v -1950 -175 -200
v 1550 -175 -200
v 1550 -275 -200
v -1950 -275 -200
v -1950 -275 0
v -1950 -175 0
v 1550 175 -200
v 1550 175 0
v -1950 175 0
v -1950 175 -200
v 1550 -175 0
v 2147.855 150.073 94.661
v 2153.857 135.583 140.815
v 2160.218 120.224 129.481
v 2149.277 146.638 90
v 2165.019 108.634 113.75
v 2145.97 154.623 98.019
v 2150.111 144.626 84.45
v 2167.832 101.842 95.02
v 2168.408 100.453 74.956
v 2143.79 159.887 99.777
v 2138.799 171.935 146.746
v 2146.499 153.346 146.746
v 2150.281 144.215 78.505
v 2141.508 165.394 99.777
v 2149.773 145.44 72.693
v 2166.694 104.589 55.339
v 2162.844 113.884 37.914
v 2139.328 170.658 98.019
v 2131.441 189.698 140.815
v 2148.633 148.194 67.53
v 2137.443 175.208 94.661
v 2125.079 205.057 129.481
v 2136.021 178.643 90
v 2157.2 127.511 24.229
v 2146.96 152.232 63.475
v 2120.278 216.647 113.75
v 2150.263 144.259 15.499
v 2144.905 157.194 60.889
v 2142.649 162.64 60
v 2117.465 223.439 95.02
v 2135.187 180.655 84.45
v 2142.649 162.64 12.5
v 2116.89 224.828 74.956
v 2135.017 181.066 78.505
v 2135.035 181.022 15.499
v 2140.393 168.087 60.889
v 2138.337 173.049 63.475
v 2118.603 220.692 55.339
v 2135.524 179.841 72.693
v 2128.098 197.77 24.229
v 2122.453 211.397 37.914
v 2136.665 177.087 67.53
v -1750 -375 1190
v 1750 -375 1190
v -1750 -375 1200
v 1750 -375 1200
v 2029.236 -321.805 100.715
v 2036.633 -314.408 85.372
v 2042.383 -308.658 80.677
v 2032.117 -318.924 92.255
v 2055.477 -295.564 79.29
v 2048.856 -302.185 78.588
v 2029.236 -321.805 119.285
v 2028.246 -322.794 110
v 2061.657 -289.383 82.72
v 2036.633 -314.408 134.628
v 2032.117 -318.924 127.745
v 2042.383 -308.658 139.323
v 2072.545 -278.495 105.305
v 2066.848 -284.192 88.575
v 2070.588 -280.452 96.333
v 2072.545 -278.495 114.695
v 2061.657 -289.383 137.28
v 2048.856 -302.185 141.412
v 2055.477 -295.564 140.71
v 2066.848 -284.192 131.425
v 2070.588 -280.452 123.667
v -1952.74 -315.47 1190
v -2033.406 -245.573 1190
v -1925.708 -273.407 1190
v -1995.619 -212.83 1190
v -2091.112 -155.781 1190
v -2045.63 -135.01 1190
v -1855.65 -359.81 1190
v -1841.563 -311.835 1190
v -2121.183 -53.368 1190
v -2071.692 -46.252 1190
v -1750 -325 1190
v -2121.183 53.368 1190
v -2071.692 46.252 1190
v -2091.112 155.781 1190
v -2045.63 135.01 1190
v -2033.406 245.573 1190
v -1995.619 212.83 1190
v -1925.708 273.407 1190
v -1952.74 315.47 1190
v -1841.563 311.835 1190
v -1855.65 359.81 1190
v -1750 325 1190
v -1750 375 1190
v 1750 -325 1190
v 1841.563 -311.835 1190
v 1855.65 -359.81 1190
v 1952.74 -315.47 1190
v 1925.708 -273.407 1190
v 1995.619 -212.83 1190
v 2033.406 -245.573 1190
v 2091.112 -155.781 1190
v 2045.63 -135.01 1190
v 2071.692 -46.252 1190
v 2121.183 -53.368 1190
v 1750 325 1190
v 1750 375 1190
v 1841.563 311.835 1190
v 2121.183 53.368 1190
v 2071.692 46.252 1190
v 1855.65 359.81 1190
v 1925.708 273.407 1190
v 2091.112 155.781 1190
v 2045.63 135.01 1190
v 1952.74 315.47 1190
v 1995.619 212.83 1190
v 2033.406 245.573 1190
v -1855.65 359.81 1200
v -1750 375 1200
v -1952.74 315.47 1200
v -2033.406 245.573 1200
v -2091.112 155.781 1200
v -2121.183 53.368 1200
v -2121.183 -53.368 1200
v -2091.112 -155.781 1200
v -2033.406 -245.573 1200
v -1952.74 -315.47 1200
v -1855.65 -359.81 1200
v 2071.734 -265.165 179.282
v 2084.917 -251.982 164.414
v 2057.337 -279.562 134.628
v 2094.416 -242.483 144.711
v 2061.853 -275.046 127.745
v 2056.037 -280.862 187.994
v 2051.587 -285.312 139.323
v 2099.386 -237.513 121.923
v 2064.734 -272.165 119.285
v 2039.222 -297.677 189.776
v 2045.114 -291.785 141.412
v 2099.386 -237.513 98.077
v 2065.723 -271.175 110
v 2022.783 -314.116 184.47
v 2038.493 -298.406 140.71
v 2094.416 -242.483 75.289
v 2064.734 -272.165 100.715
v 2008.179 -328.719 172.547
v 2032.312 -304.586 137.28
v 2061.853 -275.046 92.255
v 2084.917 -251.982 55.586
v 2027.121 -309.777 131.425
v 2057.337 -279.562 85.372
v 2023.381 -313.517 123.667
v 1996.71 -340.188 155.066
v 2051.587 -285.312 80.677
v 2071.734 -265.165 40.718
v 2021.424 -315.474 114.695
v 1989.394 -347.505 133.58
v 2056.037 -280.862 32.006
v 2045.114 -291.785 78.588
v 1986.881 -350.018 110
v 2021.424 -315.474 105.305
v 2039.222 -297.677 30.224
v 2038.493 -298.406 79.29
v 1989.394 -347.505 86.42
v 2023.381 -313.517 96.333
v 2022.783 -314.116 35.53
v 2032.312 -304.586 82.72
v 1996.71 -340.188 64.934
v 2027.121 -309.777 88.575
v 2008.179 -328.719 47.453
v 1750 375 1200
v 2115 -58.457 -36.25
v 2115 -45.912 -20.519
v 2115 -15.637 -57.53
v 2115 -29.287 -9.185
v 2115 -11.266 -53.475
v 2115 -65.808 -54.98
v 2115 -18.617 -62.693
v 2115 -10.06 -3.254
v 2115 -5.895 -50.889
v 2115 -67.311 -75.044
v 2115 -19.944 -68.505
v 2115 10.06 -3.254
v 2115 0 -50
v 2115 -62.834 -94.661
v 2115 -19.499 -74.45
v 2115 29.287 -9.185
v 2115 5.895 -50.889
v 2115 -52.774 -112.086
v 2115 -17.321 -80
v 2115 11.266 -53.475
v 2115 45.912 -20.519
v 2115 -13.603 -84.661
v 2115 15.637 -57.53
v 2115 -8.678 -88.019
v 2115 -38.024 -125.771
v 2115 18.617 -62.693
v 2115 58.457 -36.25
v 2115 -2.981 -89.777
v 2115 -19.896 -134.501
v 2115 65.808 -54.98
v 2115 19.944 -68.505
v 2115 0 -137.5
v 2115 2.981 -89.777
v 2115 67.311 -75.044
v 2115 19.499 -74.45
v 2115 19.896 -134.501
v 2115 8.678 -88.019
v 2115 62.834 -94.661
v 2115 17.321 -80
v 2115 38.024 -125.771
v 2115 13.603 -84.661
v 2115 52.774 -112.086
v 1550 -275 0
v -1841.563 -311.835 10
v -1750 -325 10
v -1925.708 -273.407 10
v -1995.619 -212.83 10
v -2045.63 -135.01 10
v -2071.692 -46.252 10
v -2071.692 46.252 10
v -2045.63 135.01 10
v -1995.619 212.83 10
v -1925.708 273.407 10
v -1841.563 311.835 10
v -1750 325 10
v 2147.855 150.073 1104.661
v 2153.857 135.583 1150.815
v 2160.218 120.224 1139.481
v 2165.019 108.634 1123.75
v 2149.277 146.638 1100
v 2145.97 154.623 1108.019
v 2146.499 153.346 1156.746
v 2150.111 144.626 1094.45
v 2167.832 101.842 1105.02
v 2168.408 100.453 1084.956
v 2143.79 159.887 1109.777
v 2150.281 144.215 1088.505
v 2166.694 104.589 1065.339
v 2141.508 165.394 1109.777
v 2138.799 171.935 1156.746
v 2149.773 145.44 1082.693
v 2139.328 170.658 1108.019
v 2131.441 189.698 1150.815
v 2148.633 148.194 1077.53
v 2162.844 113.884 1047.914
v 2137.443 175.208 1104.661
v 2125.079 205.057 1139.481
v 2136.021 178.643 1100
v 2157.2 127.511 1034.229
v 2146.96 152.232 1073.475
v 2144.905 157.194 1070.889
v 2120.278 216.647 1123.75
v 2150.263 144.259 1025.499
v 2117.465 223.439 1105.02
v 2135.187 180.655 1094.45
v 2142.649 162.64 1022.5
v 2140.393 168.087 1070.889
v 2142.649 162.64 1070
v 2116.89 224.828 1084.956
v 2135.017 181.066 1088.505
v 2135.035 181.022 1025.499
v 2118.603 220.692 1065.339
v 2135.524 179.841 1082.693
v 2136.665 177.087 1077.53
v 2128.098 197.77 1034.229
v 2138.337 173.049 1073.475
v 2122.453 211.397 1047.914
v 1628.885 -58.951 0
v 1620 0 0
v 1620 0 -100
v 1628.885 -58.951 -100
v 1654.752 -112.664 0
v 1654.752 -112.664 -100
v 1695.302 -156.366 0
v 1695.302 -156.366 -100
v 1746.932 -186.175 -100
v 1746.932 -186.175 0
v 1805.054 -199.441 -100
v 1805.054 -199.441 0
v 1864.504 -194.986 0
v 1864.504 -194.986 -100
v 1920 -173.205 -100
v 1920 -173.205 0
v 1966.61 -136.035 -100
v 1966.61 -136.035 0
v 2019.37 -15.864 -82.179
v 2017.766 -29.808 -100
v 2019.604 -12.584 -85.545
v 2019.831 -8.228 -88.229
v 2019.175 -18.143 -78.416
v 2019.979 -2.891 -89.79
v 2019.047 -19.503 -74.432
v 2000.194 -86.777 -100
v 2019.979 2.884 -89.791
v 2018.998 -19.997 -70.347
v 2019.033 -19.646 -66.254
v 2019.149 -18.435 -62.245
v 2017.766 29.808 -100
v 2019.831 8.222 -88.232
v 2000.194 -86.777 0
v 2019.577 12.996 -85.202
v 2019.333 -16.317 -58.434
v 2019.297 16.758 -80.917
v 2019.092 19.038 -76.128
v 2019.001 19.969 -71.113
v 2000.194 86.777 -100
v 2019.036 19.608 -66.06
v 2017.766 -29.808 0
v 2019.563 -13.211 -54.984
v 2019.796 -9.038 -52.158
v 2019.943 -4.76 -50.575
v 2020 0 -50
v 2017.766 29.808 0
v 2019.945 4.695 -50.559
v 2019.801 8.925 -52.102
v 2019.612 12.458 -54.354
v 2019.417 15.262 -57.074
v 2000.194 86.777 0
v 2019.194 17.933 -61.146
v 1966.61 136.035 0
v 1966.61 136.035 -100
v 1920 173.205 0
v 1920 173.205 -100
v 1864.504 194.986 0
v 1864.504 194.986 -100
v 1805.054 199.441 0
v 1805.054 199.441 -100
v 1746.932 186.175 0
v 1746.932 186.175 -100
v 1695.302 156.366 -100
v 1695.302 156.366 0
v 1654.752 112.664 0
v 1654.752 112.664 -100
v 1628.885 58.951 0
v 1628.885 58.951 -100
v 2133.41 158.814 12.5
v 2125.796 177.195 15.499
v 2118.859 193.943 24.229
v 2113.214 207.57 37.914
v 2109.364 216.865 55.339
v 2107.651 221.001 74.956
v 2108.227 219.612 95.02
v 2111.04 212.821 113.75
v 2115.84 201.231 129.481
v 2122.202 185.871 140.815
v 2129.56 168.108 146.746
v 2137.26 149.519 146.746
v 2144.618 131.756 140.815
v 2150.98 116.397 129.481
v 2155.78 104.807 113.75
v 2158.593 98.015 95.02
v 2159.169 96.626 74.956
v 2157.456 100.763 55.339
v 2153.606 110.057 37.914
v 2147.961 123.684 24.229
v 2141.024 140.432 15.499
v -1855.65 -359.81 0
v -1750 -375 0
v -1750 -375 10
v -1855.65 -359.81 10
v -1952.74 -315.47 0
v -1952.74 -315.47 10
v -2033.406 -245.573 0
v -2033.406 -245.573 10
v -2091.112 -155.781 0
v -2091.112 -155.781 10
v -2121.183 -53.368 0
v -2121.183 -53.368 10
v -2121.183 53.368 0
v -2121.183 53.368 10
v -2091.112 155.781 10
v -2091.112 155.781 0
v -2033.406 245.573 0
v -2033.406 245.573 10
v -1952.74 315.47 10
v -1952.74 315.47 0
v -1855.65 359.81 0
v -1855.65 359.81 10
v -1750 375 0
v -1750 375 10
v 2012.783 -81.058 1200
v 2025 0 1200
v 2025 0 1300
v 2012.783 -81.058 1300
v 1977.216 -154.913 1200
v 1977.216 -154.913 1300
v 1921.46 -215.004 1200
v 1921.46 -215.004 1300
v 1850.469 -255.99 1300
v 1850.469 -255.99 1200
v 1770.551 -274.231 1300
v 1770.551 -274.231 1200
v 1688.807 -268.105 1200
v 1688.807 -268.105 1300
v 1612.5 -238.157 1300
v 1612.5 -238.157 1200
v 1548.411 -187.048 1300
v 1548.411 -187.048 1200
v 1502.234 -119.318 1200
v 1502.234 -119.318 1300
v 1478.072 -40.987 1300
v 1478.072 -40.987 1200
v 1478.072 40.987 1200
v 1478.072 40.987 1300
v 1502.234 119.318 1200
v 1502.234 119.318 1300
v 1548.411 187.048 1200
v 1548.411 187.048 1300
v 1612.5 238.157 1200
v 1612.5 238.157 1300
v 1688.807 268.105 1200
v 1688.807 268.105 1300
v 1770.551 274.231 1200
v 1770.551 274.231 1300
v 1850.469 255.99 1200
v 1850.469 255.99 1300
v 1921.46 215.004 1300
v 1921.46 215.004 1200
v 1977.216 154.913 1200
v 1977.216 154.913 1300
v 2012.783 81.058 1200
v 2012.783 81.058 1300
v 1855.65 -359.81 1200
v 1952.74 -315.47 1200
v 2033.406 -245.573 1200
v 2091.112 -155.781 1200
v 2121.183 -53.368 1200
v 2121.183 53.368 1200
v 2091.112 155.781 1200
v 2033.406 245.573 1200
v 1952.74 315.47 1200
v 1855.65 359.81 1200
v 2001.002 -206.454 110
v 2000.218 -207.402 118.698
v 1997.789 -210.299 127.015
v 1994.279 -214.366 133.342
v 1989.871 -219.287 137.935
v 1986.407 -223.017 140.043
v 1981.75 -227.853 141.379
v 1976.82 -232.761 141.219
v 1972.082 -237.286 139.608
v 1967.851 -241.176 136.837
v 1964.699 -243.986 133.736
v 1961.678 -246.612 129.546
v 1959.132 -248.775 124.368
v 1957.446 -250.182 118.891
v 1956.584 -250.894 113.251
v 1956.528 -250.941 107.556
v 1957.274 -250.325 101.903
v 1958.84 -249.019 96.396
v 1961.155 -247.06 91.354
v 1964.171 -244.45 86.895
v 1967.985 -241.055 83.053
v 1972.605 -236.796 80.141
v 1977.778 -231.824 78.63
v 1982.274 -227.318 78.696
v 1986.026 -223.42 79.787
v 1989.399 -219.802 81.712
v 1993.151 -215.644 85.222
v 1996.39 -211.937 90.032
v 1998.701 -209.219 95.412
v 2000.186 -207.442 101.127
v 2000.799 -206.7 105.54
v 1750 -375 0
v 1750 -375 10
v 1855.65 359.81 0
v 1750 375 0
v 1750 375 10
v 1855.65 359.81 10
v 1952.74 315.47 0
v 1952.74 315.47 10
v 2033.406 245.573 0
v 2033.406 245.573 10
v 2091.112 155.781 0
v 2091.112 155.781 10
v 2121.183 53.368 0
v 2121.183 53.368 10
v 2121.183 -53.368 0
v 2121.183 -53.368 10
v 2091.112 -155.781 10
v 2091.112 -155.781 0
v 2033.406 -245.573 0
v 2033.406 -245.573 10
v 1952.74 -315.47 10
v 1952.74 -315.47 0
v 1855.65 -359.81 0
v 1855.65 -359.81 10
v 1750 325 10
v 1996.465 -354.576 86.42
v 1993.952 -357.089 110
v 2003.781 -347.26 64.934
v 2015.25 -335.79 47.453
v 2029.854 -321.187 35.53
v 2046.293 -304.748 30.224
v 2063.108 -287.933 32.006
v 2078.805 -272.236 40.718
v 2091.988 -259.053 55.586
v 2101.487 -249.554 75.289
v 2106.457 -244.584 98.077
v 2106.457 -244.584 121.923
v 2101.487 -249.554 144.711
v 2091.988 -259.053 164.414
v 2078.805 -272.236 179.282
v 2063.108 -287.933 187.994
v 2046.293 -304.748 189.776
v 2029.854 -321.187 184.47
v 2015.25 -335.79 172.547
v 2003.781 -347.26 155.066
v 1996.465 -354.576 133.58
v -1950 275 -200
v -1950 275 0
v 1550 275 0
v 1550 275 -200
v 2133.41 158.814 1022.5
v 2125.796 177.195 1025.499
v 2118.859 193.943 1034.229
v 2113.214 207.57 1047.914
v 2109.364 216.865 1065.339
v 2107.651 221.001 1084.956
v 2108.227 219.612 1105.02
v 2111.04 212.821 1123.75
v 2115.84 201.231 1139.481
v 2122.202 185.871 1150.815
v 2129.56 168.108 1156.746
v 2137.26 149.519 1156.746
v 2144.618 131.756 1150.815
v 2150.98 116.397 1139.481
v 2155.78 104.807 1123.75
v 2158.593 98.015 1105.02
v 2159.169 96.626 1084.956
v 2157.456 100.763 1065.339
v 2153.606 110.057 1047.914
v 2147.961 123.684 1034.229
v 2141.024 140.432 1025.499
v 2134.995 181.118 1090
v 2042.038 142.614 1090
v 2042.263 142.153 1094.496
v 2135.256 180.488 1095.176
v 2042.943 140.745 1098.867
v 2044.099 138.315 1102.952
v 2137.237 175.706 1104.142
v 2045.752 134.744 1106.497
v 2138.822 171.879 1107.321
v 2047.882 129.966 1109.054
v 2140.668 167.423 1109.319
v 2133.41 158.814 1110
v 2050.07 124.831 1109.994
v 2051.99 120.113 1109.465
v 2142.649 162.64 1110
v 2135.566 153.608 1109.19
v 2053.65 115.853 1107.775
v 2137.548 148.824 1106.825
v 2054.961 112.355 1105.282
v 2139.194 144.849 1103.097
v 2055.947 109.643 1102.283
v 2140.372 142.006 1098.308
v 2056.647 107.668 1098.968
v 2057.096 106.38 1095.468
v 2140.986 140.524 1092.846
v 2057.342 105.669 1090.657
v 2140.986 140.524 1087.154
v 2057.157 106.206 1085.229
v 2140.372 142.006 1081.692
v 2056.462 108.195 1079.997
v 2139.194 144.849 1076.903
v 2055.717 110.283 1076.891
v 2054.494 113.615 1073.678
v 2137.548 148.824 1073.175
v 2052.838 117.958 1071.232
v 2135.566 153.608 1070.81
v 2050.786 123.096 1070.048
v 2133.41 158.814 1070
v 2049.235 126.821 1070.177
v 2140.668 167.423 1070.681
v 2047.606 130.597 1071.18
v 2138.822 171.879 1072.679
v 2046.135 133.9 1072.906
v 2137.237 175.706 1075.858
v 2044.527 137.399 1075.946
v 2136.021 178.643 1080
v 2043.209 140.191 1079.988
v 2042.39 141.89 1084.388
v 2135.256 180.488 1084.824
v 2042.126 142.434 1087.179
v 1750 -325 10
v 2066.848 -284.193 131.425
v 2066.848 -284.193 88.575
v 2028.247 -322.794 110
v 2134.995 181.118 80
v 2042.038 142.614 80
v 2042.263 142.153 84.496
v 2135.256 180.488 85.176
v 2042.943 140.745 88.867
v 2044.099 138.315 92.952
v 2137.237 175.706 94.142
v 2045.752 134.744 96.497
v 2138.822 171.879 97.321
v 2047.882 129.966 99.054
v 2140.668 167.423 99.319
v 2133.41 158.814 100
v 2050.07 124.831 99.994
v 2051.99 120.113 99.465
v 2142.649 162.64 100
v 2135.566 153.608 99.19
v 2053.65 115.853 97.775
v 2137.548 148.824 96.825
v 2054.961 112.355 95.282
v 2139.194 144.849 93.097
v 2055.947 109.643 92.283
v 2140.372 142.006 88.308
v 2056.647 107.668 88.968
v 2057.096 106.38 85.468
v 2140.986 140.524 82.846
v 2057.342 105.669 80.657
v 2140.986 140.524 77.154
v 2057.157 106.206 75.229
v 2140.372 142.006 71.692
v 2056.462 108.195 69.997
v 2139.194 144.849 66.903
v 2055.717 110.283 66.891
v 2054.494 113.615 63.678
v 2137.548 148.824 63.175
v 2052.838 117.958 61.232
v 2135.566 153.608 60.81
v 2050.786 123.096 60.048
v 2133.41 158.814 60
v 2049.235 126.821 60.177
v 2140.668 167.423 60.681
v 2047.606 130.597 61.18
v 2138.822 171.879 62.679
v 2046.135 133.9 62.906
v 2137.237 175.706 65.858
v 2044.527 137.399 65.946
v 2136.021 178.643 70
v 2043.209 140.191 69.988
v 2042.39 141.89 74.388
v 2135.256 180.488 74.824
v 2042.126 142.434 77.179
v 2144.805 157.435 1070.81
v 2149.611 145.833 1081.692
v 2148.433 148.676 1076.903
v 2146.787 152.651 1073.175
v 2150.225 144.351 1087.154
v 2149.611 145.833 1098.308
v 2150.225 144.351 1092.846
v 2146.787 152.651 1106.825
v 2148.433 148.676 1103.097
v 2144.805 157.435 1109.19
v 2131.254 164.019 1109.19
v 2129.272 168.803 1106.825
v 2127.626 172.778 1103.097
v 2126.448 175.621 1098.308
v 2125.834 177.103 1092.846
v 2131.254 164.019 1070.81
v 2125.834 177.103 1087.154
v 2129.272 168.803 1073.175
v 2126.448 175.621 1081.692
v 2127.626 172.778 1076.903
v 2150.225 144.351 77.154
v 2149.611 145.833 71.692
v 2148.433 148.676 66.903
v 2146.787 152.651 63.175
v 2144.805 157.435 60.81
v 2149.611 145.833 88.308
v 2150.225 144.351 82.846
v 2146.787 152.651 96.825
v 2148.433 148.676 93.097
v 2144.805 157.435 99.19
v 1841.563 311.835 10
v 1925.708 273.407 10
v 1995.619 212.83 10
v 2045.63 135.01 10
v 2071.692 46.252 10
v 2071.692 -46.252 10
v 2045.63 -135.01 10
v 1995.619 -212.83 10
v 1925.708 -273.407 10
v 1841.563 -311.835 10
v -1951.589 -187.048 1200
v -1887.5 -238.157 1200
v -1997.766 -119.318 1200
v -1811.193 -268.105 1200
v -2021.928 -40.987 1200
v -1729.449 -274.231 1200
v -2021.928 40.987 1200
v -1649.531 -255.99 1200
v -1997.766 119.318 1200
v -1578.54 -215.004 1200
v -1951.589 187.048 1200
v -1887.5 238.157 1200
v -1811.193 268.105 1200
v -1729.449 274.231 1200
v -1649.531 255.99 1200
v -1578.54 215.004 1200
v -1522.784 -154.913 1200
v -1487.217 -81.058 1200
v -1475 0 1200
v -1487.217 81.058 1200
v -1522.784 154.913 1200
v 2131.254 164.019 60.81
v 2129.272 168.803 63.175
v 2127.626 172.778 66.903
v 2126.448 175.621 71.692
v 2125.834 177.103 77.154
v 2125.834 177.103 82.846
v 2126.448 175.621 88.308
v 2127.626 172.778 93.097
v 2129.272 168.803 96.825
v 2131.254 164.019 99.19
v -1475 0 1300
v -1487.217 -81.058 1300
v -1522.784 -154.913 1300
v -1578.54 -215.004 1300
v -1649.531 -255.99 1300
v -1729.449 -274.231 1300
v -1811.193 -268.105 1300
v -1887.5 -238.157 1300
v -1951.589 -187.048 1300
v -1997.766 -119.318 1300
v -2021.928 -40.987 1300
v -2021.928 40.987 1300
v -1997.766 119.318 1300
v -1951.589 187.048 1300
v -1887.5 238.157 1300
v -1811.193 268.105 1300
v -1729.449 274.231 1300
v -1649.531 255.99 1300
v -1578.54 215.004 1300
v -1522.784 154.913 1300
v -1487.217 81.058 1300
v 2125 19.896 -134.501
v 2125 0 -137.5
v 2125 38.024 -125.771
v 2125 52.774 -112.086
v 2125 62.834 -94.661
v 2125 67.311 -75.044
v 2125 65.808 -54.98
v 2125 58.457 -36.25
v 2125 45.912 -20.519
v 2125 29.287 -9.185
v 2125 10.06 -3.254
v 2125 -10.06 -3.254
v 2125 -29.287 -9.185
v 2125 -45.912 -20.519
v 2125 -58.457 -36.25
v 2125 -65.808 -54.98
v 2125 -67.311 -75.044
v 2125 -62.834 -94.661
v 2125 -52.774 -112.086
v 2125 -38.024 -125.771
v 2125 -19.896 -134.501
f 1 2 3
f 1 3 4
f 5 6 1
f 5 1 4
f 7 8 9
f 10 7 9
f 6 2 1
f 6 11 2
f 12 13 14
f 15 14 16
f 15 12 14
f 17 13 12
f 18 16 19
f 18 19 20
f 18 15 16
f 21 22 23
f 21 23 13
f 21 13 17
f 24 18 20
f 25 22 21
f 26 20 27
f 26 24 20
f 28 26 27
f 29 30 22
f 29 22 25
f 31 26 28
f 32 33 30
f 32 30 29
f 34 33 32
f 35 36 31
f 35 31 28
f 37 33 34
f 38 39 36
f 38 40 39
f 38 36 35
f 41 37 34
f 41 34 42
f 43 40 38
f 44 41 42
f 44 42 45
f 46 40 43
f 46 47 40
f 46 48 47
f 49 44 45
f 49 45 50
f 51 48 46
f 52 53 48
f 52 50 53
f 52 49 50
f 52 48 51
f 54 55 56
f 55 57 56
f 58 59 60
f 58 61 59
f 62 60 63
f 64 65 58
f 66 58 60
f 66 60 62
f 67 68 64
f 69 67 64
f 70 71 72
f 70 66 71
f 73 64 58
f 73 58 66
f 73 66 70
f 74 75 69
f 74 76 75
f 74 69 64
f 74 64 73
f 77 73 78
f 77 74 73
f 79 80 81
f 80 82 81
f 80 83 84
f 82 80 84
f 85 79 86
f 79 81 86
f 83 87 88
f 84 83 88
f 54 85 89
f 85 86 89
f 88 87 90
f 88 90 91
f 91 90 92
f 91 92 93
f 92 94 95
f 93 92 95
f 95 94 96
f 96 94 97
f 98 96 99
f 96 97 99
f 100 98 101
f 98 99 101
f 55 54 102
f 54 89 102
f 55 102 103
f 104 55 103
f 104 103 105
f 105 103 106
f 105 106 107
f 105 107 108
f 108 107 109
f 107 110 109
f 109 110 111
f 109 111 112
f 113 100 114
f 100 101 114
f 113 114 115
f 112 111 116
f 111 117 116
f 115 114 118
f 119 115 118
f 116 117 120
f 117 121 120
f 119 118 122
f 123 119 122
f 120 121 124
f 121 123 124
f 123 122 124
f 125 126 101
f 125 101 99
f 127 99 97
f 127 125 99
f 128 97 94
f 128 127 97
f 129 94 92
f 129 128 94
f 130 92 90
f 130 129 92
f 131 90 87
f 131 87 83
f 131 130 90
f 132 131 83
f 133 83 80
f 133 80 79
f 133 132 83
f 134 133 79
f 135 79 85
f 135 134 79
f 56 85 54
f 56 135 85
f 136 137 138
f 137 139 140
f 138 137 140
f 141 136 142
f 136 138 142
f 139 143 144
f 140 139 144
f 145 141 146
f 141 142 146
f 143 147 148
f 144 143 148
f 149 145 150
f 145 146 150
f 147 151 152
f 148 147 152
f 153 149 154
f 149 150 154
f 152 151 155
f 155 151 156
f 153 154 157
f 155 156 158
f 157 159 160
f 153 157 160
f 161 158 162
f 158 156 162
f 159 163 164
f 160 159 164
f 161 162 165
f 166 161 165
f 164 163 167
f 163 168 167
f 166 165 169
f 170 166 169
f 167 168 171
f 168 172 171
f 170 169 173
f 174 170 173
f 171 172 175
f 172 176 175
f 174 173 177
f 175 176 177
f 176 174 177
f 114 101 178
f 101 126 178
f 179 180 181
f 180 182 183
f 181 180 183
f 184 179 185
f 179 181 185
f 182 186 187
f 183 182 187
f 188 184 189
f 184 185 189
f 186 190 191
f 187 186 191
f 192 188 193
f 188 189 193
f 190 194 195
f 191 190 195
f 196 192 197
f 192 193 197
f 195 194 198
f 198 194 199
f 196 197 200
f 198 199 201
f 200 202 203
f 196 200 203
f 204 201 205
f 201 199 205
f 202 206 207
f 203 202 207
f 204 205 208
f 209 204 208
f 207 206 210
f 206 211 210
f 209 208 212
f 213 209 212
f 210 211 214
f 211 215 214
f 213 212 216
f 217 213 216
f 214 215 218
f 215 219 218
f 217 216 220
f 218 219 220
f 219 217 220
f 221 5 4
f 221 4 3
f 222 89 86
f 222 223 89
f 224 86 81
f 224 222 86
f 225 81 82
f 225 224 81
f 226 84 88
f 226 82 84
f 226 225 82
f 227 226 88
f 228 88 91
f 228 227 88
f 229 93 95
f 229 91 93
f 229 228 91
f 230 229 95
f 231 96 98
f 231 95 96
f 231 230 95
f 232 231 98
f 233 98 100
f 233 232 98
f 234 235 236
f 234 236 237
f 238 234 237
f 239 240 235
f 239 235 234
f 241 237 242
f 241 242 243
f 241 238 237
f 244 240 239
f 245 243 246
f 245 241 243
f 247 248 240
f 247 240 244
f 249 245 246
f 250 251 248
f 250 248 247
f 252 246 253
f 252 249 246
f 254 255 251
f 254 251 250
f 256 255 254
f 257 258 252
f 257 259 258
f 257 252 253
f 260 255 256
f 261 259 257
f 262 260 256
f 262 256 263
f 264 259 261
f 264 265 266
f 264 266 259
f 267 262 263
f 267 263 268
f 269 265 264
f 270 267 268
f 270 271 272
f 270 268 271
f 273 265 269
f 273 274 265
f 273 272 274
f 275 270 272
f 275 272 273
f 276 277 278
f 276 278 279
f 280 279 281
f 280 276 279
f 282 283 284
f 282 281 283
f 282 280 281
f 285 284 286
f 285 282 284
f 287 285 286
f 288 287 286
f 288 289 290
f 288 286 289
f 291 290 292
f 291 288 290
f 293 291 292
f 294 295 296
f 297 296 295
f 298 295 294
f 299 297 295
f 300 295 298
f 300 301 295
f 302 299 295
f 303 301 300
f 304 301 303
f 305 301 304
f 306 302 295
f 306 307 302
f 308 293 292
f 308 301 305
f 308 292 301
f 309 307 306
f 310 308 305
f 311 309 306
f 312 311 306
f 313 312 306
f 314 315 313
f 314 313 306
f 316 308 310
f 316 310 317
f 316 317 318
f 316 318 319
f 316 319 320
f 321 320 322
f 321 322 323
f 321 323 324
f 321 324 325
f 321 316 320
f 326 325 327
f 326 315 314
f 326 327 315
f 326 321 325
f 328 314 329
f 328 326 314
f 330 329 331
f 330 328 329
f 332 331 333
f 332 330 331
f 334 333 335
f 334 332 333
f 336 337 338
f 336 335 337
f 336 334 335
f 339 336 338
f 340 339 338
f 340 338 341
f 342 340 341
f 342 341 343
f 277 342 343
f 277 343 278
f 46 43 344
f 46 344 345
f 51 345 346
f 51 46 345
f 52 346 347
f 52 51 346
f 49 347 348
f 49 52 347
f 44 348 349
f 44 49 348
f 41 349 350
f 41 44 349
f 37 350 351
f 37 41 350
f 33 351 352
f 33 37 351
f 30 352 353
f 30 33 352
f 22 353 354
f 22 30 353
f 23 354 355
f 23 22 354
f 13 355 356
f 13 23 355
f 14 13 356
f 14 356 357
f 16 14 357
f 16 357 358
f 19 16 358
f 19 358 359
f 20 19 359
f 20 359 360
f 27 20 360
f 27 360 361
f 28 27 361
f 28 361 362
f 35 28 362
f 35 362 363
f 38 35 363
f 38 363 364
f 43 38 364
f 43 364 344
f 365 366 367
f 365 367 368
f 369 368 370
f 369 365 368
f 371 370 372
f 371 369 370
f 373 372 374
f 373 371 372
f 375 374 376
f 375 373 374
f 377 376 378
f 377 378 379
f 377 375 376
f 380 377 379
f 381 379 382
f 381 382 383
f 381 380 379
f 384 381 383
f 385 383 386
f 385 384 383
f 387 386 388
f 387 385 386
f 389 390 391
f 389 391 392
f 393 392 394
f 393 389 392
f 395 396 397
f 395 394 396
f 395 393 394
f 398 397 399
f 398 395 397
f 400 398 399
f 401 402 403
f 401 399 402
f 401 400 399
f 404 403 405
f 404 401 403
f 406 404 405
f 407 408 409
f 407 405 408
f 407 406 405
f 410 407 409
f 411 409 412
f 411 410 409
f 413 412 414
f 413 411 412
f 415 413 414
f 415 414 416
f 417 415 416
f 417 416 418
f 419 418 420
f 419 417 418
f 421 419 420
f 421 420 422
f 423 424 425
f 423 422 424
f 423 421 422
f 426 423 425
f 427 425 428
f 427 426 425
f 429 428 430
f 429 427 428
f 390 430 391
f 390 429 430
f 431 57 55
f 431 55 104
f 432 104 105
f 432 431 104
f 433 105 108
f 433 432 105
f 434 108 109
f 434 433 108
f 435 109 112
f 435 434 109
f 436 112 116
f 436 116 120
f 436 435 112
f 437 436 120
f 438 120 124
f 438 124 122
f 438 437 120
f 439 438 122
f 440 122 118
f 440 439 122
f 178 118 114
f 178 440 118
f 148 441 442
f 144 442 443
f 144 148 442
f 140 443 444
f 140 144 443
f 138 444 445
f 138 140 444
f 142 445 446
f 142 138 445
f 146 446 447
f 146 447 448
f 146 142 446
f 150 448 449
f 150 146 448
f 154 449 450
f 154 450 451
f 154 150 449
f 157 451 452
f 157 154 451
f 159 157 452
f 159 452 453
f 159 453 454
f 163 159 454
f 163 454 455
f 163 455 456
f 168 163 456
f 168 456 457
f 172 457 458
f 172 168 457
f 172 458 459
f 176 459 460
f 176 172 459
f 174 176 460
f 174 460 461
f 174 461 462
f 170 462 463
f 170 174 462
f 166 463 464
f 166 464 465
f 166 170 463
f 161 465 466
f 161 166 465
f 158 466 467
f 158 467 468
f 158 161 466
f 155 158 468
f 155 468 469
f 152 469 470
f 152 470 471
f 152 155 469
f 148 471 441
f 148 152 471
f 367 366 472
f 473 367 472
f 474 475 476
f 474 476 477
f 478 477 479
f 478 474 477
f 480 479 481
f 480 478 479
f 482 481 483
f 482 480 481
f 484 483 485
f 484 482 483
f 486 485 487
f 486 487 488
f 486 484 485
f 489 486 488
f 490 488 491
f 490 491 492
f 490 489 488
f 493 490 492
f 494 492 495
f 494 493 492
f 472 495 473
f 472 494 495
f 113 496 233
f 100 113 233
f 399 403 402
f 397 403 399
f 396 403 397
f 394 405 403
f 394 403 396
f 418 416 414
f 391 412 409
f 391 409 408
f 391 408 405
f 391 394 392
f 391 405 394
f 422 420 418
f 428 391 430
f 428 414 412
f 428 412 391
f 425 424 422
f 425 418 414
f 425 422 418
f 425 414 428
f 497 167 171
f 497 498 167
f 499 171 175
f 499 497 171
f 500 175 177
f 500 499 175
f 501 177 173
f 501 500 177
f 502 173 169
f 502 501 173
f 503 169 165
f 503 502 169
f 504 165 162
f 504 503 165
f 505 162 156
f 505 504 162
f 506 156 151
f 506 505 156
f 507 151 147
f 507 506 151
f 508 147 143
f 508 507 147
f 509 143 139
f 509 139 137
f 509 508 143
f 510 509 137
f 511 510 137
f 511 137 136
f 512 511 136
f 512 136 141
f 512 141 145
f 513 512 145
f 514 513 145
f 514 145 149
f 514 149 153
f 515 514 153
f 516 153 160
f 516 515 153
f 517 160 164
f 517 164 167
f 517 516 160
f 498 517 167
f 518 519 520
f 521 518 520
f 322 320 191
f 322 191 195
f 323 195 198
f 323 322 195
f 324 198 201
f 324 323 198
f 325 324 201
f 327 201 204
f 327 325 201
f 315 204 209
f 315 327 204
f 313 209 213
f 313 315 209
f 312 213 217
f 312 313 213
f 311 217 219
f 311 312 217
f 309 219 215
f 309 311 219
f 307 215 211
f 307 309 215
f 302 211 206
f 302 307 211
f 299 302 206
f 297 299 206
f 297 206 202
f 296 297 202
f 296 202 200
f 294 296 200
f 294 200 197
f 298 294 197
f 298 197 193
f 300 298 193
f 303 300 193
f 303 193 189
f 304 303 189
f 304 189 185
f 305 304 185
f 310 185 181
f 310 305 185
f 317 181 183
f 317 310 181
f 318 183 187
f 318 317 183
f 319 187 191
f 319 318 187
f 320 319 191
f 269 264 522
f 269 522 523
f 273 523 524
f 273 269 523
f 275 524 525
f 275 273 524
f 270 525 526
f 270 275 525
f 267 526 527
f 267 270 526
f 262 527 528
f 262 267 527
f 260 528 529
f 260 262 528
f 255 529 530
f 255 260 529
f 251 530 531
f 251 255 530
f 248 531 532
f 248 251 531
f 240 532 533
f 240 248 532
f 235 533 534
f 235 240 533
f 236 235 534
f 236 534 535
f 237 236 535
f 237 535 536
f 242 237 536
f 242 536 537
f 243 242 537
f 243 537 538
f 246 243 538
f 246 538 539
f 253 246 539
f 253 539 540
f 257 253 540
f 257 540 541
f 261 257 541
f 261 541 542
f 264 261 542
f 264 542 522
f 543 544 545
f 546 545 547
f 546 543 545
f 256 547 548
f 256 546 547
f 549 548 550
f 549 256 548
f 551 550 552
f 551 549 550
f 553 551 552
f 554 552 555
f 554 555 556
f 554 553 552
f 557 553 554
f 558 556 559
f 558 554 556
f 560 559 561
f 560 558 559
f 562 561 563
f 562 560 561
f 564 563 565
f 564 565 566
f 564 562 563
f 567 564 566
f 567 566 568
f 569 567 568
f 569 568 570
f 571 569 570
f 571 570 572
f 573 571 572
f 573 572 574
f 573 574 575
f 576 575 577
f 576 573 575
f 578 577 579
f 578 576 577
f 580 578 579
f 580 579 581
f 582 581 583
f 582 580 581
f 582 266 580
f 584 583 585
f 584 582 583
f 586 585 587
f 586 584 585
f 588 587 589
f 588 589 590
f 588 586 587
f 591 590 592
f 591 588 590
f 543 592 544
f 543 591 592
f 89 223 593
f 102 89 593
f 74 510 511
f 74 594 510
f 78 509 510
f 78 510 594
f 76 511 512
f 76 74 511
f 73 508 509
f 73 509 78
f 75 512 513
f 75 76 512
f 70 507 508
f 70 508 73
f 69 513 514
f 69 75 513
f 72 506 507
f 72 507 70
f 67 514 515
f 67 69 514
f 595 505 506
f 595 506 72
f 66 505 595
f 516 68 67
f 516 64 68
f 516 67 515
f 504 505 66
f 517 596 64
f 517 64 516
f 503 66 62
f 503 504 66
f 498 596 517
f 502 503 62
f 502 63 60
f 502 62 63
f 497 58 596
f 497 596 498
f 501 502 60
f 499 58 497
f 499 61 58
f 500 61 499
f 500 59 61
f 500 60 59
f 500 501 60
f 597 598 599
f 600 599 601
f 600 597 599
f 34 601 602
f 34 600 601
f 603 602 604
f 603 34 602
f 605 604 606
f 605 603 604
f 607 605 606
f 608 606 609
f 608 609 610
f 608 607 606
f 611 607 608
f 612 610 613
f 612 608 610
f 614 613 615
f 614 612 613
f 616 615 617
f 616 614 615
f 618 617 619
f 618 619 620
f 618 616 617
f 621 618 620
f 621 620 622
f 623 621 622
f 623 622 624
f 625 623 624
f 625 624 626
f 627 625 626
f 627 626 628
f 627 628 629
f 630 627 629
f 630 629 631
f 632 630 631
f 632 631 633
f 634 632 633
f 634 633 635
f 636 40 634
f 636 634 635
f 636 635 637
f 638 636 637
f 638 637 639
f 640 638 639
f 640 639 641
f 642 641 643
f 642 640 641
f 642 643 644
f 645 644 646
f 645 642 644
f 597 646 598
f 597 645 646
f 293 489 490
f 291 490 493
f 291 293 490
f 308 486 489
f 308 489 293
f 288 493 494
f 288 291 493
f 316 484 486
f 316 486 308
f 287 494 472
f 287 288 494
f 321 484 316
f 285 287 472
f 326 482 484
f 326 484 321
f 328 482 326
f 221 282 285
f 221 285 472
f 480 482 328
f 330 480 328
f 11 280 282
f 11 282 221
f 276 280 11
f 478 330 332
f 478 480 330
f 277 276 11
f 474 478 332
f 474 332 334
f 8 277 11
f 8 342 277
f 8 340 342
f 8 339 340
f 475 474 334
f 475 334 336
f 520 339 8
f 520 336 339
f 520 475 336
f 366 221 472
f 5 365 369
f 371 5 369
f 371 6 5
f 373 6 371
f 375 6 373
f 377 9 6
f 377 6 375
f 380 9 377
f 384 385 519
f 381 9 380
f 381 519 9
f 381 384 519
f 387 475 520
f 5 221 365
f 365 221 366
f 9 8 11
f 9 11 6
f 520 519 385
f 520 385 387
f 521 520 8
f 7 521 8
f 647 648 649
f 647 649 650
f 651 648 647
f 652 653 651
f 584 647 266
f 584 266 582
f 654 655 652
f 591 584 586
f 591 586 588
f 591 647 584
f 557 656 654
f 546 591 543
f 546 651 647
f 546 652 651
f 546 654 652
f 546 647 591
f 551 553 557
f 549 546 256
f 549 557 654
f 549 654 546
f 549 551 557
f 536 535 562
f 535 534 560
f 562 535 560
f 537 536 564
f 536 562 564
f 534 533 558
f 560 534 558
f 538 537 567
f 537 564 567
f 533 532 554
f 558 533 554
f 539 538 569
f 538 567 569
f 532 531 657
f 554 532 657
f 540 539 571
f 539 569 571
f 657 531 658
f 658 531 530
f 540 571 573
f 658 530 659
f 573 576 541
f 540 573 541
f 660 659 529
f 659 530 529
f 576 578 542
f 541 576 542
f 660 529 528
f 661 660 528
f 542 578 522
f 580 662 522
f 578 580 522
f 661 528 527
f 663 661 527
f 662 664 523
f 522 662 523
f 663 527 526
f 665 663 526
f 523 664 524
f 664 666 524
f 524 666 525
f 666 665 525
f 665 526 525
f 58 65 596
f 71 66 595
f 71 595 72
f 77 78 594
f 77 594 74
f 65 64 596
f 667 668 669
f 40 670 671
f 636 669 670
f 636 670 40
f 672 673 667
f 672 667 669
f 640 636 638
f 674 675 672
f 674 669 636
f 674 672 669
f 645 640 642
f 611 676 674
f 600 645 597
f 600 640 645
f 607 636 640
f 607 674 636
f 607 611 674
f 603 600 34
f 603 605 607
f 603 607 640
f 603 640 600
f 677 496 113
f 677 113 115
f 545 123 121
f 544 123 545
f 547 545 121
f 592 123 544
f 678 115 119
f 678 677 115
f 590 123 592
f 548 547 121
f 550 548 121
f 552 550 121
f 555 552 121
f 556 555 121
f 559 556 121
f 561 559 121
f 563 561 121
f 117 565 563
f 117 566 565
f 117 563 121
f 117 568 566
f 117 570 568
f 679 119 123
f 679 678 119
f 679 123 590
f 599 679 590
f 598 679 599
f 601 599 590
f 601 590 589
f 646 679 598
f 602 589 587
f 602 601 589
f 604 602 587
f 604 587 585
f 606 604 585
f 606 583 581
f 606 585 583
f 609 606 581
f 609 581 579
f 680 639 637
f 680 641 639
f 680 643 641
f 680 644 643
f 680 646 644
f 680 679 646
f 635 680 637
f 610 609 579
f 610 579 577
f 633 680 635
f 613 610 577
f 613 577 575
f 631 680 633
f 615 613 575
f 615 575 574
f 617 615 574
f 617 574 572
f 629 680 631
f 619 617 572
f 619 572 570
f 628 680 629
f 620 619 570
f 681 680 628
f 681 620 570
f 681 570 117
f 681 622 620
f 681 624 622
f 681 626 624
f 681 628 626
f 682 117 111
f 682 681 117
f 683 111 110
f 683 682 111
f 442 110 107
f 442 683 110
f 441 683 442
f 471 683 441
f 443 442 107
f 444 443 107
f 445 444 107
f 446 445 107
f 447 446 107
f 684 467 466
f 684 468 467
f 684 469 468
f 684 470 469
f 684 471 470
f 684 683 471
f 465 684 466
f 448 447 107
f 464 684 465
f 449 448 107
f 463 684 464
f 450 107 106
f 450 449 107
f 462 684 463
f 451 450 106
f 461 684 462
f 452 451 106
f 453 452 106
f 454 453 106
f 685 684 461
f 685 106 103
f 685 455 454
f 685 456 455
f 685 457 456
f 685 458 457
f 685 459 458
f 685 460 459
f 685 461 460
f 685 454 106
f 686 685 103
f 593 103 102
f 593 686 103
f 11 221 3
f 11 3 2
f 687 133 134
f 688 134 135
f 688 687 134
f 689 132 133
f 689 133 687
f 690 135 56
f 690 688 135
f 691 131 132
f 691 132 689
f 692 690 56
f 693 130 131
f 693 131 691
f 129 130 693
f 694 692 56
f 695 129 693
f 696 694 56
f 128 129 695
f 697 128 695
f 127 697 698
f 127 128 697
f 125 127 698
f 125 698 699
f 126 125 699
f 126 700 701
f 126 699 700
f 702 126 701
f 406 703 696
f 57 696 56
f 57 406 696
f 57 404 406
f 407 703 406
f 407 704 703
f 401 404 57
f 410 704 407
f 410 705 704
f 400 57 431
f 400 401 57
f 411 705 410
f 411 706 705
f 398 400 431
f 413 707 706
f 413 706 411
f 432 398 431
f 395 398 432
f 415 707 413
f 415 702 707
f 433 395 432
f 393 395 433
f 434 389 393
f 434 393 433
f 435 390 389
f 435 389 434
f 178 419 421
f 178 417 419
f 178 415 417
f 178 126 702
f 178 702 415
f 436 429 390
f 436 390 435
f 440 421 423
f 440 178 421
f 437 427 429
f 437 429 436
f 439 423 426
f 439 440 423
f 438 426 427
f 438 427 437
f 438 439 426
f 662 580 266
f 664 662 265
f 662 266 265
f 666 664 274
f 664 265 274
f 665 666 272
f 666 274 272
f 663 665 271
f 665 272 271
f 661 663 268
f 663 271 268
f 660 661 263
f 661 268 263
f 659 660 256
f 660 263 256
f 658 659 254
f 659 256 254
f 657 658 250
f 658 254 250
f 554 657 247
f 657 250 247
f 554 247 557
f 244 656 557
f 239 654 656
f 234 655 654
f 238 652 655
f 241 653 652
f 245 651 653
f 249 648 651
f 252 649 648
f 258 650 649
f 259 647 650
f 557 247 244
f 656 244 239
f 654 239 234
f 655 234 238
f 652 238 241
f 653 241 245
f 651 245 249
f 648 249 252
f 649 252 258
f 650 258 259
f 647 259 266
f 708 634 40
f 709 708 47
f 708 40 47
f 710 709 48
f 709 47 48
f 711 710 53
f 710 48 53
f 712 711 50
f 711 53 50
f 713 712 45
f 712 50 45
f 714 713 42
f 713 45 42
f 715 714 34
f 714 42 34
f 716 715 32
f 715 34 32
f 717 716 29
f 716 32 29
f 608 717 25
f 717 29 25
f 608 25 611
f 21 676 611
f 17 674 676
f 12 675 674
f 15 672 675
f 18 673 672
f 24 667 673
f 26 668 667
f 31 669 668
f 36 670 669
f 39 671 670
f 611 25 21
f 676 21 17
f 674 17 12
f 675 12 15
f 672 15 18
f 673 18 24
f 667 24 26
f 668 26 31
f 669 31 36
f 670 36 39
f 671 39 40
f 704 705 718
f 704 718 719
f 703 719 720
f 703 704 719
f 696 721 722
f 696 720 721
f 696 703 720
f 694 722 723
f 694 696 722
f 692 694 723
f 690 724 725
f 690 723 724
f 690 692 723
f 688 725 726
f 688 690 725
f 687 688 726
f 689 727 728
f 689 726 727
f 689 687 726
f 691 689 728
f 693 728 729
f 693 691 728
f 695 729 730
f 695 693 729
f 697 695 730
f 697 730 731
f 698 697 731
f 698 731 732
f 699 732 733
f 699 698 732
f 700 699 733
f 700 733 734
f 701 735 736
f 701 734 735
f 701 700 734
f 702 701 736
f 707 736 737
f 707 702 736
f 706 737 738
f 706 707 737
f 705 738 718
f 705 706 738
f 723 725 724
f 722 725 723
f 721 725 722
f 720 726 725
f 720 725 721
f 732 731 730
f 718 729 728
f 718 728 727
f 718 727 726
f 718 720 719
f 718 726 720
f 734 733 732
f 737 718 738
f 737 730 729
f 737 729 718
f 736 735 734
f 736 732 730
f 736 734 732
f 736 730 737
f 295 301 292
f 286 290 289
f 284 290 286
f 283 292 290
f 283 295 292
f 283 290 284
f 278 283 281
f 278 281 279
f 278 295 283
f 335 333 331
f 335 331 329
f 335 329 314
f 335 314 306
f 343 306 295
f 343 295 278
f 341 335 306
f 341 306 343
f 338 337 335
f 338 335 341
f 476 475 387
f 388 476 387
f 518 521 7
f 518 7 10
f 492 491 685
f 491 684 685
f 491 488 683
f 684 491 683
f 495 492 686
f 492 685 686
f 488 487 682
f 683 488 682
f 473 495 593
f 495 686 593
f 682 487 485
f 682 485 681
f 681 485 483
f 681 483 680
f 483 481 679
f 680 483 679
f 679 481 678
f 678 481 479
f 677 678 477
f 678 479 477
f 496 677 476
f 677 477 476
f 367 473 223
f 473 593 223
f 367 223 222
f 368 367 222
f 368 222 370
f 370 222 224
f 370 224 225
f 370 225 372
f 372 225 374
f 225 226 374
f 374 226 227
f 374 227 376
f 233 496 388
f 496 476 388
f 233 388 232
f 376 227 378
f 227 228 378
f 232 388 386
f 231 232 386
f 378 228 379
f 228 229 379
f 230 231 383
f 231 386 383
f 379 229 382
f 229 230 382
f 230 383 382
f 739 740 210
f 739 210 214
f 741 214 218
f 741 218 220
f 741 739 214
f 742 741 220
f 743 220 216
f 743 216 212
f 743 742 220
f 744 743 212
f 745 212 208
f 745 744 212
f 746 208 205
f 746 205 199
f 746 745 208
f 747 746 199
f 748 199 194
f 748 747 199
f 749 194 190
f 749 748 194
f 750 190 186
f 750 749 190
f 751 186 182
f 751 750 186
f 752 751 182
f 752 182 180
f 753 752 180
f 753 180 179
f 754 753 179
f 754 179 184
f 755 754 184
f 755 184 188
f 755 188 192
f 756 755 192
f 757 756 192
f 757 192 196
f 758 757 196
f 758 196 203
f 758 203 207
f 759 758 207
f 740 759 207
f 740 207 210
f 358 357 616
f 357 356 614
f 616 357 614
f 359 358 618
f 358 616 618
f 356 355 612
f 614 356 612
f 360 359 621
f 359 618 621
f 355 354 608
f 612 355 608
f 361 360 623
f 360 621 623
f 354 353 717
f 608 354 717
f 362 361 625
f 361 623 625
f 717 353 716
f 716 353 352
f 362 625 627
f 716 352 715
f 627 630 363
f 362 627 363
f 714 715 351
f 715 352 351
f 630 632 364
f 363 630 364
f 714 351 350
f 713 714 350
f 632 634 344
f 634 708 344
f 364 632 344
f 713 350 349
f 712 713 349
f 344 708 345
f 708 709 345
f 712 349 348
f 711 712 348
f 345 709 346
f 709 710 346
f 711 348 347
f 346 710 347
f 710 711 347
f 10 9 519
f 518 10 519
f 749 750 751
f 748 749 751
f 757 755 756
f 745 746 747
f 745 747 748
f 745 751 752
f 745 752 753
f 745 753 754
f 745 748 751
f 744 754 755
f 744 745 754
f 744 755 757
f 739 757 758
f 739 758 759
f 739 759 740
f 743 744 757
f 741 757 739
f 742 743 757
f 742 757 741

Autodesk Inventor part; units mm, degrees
sketch "Sketch1" plane through (0, 0, 0) normal (0, 0, 1) x (1, 0, 0)
  line L0 (-1750, 0) -> (1750, 0) construction
  line L1 (-1750, -325) -> (1750, -325)
  line L2 (1750, 325) -> (-1750, 325)
  arc A0 (-1750, 325) -> (-1750, -325) centre (-1750, 0) ccw
  arc A1 (1750, -325) -> (1750, 325) centre (1750, 0) ccw
  point P0 (0, 0)
  point P1 (0, 0)
  dimension "d0" = 3500
  dimension "d1" = 650
extrude "Extrusion1" add sketch "Sketch1" along normal blind 1200
sketch "Sketch2" plane through (0, 0, 1200) normal (0, 0, 1) x (1, 0, 0)
  arc A0 (1750, -325) -> (1750, 325) centre (1750, 0) ccw projected
  line L0 (1750, 325) -> (-1750, 325) projected
  arc A1 (-1750, 325) -> (-1750, -325) centre (-1750, 0) ccw projected
  line L1 (-1750, -325) -> (1750, -325) projected
  line L2 (-1750, 375) -> (1750, 375)
  arc A2 (1750, -375) -> (1750, 375) centre (1750, 0) ccw
  line L3 (1750, -375) -> (-1750, -375)
  arc A3 (-1750, 375) -> (-1750, -375) centre (-1750, 0) ccw
  point P0 (0, 0)
  dimension "d4" = 50
extrude "Extrusion2" add sketch "Sketch2" against normal blind 10
sketch "Sketch3" plane through (0, 0, 0) normal (0, 0, -1) x (-1, 0, 0)
  arc A0 (-1750, 325) -> (-1750, -325) centre (-1750, 0) ccw projected
  line L0 (1750, -325) -> (-1750, -325) projected
  arc A1 (1750, -325) -> (1750, 325) centre (1750, 0) ccw projected
  line L1 (-1750, 325) -> (1750, 325) projected
  arc A2 (-1750, 375) -> (-1750, -375) centre (-1750, 0) ccw
  line L2 (-1750, 375) -> (1750, 375)
  arc A3 (1750, -375) -> (1750, 375) centre (1750, 0) ccw
  line L3 (1750, -375) -> (-1750, -375)
  point P0 (0, 0)
  dimension "d7" = 50
extrude "Extrusion3" add sketch "Sketch3" against normal blind 10
sketch "Sketch4" plane through (0, 0, 0) normal (0, 0, -1) x (-1, 0, 0)
  circle A0 centre (-1820, 0) radius 200
  arc A1 (-1750, 325) -> (-1750, -325) centre (-1750, 0) ccw projected
  arc A2 (-1750, 325) -> (-1750, -325) centre (-1750, 0) ccw projected
  point P0 (0, 0)
  dimension "d10" = 400
  dimension "d59" = 70
extrude "Extrusion4" add sketch "Sketch4" along normal blind 100
ref_plane "Work Plane1" through (1750, -325, 0) normal (-1, 0, 0) x (0, 0, 1)
sketch "Sketch5" plane through (1750, -325, 0) normal (-1, 0, 0) x (0, 0, 1)
  line L0 (-100, 525) -> (-100, 125) projected
  line L1 (0, 125) -> (0, 525) projected
  circle A0 centre (-70, 325) radius 20
  point P0 (0, 325)
  point P1 (0, 125)
  point P2 (0, 525)
  point P3 (0, 325)
  dimension "d13" = 40
  dimension "d14" = 30
extrude "Extrusion5" add sketch "Sketch5" against normal blind 375
sketch "Sketch6" plane through (2125, 0, -70) normal (1, 0, 0) x (0, 0, -1)
  circle A0 centre (0, 0) radius 20 projected
  circle A1 centre (0, 0) radius 67.5
  line L0 (-70, -375) -> (-70, 375) projected
  line L1 (67.5, 0) -> (67.5, -294.9779)
  point P0 (-70, 0)
  dimension "d18" = 135
  dimension "d40" = 137.5
extrude "Extrusion6" add sketch "Sketch6" against normal blind 10
sketch "Sketch7" plane through (0, 0, 1200) normal (0, 0, 1) x (1, 0, 0)
  line L0 (1750, 375) -> (-1750, 375) projected
  arc A0 (-1750, 375) -> (-1750, -375) centre (-1750, 0) ccw projected
  line L1 (-1750, -375) -> (1750, -375) projected
  arc A1 (1750, -375) -> (1750, 375) centre (1750, 0) ccw projected
  line L2 (1750, 0) -> (2125, 0)
  line L3 (1750, 0) -> (2096.4548, 143.5063)
  line L4 (1750, 0) -> (2015.165, -265.165)
  point P0 (0, 0)
  dimension "d21" = 22.5
  dimension "d23" = 45
ref_plane "Work Plane2" through (2096.4548, 143.5063, 1200) normal (0.9239, 0.3827, 0) x (-0.3827, 0.9239, 0)
ref_plane "Work Plane3" through (2015.165, -265.165, 1200) normal (0.7071, -0.7071, 0) x (0.7071, 0.7071, 0)
sketch "Sketch8" plane through (2096.4548, 143.5063, 1200) normal (0.9239, 0.3827, 0) x (-0.3827, 0.9239, 0)
  line L0 (300.2608, -1190) -> (300.2608, -10) projected
  line L1 (-300.2608, -1190) -> (-300.2608, -10) projected
  circle A0 centre (0, -110) radius 20
  circle A1 centre (0, -1120) radius 20
  line L2 (-300.2608, -1190) -> (300.2608, -1190) projected
  line L3 (300.2608, -10) -> (-300.2608, -10) projected
  point P0 (669.696, -1200)
  point P1 (0, 0)
  point P2 (0, 0)
  point P3 (0, 0)
  dimension "d24" = 40
extrude "Extrusion7" add sketch "Sketch8" along normal blind 50 and the other way blind 100 contours A0 | A1
sketch "Sketch9" plane through (2015.165, -265.165, 1200) normal (0.7071, -0.7071, 0) x (0.7071, 0.7071, 0)
  line L0 (229.8097, -1190) -> (229.8097, -10) projected
  line L1 (-229.8097, -1190) -> (-229.8097, -10) projected
  circle A0 centre (0, -1090) radius 31.5
  line L2 (-229.8097, -1190) -> (229.8097, -1190) projected
  line L3 (229.8097, -10) -> (-229.8097, -10) projected
  point P0 (-1237.4369, -1200)
  point P1 (0, 0)
  point P2 (0, 0)
  point P3 (0, 0)
  dimension "d31" = 63
extrude "Extrusion8" add sketch "Sketch9" along normal blind 50 and the other way blind 100 contours A0
sketch "Sketch10" plane through (2050.5204, -300.5204, 110) normal (0.7071, -0.7071, 0) x (-0.7071, -0.7071, 0)
  circle A0 centre (0, 0) radius 31.5 projected
  circle A1 centre (0, 0) radius 80
  point P0 (1237.4369, 110)
  dimension "d37" = 160
extrude "Extrusion9" add sketch "Sketch10" against normal blind 10
sketch "Sketch13" plane through (2142.6488, 162.6405, 80) normal (0.9239, 0.3827, 0) x (0, 0, -1)
  circle A0 centre (0, 0) radius 20 projected
  circle A1 centre (-1010, 0) radius 20 projected
  circle A2 centre (-1010, 0) radius 67.5
  circle A3 centre (0, 0) radius 67.5
  point P0 (80, 669.696)
  dimension "d44" = 135
  dimension "d45" = 135
extrude "Extrusion10" add sketch "Sketch13" against normal blind 10
sketch "Sketch14" plane through (0, 0, 1200) normal (0, 0, 1) x (1, 0, 0)
  arc A0 (-1750, 325) -> (-1750, -325) centre (-1750, 0) ccw projected
  circle A1 centre (-1750, 0) radius 275
  arc A2 (1750, -325) -> (1750, 325) centre (1750, 0) ccw projected
  circle A3 centre (1750, 0) radius 275
  point P0 (0, 0)
  dimension "d48" = 550
  dimension "d49" = 550
extrude "Extrusion11" add sketch "Sketch14" along normal blind 100
sketch "Sketch15" plane through (0, 0, 0) normal (0, 0, -1) x (-1, 0, 0)
  line L0 (-1550, -175) -> (1950, -175)
  line L1 (1950, -175) -> (1950, -275)
  line L2 (1950, -275) -> (-1550, -275)
  line L3 (-1550, -275) -> (-1550, -175)
  line L4 (-1550, 175) -> (1950, 175)
  line L5 (1950, 175) -> (1950, 275)
  line L6 (1950, 275) -> (-1550, 275)
  line L7 (-1550, 275) -> (-1550, 175)
  line L8 (0, 0) -> (1601.4789, 0)
  line L9 (1750, 375) -> (-1750, 375) projected
  point P0 (200, -275)
  point P1 (0, 375)
  dimension "d52" = 100
  dimension "d53" = 550
  dimension "d58" = 1950
  dimension "d60" = 1550
extrude "Extrusion12" add sketch "Sketch15" along normal blind 200
properties part number "GNG НаOCl tank"
